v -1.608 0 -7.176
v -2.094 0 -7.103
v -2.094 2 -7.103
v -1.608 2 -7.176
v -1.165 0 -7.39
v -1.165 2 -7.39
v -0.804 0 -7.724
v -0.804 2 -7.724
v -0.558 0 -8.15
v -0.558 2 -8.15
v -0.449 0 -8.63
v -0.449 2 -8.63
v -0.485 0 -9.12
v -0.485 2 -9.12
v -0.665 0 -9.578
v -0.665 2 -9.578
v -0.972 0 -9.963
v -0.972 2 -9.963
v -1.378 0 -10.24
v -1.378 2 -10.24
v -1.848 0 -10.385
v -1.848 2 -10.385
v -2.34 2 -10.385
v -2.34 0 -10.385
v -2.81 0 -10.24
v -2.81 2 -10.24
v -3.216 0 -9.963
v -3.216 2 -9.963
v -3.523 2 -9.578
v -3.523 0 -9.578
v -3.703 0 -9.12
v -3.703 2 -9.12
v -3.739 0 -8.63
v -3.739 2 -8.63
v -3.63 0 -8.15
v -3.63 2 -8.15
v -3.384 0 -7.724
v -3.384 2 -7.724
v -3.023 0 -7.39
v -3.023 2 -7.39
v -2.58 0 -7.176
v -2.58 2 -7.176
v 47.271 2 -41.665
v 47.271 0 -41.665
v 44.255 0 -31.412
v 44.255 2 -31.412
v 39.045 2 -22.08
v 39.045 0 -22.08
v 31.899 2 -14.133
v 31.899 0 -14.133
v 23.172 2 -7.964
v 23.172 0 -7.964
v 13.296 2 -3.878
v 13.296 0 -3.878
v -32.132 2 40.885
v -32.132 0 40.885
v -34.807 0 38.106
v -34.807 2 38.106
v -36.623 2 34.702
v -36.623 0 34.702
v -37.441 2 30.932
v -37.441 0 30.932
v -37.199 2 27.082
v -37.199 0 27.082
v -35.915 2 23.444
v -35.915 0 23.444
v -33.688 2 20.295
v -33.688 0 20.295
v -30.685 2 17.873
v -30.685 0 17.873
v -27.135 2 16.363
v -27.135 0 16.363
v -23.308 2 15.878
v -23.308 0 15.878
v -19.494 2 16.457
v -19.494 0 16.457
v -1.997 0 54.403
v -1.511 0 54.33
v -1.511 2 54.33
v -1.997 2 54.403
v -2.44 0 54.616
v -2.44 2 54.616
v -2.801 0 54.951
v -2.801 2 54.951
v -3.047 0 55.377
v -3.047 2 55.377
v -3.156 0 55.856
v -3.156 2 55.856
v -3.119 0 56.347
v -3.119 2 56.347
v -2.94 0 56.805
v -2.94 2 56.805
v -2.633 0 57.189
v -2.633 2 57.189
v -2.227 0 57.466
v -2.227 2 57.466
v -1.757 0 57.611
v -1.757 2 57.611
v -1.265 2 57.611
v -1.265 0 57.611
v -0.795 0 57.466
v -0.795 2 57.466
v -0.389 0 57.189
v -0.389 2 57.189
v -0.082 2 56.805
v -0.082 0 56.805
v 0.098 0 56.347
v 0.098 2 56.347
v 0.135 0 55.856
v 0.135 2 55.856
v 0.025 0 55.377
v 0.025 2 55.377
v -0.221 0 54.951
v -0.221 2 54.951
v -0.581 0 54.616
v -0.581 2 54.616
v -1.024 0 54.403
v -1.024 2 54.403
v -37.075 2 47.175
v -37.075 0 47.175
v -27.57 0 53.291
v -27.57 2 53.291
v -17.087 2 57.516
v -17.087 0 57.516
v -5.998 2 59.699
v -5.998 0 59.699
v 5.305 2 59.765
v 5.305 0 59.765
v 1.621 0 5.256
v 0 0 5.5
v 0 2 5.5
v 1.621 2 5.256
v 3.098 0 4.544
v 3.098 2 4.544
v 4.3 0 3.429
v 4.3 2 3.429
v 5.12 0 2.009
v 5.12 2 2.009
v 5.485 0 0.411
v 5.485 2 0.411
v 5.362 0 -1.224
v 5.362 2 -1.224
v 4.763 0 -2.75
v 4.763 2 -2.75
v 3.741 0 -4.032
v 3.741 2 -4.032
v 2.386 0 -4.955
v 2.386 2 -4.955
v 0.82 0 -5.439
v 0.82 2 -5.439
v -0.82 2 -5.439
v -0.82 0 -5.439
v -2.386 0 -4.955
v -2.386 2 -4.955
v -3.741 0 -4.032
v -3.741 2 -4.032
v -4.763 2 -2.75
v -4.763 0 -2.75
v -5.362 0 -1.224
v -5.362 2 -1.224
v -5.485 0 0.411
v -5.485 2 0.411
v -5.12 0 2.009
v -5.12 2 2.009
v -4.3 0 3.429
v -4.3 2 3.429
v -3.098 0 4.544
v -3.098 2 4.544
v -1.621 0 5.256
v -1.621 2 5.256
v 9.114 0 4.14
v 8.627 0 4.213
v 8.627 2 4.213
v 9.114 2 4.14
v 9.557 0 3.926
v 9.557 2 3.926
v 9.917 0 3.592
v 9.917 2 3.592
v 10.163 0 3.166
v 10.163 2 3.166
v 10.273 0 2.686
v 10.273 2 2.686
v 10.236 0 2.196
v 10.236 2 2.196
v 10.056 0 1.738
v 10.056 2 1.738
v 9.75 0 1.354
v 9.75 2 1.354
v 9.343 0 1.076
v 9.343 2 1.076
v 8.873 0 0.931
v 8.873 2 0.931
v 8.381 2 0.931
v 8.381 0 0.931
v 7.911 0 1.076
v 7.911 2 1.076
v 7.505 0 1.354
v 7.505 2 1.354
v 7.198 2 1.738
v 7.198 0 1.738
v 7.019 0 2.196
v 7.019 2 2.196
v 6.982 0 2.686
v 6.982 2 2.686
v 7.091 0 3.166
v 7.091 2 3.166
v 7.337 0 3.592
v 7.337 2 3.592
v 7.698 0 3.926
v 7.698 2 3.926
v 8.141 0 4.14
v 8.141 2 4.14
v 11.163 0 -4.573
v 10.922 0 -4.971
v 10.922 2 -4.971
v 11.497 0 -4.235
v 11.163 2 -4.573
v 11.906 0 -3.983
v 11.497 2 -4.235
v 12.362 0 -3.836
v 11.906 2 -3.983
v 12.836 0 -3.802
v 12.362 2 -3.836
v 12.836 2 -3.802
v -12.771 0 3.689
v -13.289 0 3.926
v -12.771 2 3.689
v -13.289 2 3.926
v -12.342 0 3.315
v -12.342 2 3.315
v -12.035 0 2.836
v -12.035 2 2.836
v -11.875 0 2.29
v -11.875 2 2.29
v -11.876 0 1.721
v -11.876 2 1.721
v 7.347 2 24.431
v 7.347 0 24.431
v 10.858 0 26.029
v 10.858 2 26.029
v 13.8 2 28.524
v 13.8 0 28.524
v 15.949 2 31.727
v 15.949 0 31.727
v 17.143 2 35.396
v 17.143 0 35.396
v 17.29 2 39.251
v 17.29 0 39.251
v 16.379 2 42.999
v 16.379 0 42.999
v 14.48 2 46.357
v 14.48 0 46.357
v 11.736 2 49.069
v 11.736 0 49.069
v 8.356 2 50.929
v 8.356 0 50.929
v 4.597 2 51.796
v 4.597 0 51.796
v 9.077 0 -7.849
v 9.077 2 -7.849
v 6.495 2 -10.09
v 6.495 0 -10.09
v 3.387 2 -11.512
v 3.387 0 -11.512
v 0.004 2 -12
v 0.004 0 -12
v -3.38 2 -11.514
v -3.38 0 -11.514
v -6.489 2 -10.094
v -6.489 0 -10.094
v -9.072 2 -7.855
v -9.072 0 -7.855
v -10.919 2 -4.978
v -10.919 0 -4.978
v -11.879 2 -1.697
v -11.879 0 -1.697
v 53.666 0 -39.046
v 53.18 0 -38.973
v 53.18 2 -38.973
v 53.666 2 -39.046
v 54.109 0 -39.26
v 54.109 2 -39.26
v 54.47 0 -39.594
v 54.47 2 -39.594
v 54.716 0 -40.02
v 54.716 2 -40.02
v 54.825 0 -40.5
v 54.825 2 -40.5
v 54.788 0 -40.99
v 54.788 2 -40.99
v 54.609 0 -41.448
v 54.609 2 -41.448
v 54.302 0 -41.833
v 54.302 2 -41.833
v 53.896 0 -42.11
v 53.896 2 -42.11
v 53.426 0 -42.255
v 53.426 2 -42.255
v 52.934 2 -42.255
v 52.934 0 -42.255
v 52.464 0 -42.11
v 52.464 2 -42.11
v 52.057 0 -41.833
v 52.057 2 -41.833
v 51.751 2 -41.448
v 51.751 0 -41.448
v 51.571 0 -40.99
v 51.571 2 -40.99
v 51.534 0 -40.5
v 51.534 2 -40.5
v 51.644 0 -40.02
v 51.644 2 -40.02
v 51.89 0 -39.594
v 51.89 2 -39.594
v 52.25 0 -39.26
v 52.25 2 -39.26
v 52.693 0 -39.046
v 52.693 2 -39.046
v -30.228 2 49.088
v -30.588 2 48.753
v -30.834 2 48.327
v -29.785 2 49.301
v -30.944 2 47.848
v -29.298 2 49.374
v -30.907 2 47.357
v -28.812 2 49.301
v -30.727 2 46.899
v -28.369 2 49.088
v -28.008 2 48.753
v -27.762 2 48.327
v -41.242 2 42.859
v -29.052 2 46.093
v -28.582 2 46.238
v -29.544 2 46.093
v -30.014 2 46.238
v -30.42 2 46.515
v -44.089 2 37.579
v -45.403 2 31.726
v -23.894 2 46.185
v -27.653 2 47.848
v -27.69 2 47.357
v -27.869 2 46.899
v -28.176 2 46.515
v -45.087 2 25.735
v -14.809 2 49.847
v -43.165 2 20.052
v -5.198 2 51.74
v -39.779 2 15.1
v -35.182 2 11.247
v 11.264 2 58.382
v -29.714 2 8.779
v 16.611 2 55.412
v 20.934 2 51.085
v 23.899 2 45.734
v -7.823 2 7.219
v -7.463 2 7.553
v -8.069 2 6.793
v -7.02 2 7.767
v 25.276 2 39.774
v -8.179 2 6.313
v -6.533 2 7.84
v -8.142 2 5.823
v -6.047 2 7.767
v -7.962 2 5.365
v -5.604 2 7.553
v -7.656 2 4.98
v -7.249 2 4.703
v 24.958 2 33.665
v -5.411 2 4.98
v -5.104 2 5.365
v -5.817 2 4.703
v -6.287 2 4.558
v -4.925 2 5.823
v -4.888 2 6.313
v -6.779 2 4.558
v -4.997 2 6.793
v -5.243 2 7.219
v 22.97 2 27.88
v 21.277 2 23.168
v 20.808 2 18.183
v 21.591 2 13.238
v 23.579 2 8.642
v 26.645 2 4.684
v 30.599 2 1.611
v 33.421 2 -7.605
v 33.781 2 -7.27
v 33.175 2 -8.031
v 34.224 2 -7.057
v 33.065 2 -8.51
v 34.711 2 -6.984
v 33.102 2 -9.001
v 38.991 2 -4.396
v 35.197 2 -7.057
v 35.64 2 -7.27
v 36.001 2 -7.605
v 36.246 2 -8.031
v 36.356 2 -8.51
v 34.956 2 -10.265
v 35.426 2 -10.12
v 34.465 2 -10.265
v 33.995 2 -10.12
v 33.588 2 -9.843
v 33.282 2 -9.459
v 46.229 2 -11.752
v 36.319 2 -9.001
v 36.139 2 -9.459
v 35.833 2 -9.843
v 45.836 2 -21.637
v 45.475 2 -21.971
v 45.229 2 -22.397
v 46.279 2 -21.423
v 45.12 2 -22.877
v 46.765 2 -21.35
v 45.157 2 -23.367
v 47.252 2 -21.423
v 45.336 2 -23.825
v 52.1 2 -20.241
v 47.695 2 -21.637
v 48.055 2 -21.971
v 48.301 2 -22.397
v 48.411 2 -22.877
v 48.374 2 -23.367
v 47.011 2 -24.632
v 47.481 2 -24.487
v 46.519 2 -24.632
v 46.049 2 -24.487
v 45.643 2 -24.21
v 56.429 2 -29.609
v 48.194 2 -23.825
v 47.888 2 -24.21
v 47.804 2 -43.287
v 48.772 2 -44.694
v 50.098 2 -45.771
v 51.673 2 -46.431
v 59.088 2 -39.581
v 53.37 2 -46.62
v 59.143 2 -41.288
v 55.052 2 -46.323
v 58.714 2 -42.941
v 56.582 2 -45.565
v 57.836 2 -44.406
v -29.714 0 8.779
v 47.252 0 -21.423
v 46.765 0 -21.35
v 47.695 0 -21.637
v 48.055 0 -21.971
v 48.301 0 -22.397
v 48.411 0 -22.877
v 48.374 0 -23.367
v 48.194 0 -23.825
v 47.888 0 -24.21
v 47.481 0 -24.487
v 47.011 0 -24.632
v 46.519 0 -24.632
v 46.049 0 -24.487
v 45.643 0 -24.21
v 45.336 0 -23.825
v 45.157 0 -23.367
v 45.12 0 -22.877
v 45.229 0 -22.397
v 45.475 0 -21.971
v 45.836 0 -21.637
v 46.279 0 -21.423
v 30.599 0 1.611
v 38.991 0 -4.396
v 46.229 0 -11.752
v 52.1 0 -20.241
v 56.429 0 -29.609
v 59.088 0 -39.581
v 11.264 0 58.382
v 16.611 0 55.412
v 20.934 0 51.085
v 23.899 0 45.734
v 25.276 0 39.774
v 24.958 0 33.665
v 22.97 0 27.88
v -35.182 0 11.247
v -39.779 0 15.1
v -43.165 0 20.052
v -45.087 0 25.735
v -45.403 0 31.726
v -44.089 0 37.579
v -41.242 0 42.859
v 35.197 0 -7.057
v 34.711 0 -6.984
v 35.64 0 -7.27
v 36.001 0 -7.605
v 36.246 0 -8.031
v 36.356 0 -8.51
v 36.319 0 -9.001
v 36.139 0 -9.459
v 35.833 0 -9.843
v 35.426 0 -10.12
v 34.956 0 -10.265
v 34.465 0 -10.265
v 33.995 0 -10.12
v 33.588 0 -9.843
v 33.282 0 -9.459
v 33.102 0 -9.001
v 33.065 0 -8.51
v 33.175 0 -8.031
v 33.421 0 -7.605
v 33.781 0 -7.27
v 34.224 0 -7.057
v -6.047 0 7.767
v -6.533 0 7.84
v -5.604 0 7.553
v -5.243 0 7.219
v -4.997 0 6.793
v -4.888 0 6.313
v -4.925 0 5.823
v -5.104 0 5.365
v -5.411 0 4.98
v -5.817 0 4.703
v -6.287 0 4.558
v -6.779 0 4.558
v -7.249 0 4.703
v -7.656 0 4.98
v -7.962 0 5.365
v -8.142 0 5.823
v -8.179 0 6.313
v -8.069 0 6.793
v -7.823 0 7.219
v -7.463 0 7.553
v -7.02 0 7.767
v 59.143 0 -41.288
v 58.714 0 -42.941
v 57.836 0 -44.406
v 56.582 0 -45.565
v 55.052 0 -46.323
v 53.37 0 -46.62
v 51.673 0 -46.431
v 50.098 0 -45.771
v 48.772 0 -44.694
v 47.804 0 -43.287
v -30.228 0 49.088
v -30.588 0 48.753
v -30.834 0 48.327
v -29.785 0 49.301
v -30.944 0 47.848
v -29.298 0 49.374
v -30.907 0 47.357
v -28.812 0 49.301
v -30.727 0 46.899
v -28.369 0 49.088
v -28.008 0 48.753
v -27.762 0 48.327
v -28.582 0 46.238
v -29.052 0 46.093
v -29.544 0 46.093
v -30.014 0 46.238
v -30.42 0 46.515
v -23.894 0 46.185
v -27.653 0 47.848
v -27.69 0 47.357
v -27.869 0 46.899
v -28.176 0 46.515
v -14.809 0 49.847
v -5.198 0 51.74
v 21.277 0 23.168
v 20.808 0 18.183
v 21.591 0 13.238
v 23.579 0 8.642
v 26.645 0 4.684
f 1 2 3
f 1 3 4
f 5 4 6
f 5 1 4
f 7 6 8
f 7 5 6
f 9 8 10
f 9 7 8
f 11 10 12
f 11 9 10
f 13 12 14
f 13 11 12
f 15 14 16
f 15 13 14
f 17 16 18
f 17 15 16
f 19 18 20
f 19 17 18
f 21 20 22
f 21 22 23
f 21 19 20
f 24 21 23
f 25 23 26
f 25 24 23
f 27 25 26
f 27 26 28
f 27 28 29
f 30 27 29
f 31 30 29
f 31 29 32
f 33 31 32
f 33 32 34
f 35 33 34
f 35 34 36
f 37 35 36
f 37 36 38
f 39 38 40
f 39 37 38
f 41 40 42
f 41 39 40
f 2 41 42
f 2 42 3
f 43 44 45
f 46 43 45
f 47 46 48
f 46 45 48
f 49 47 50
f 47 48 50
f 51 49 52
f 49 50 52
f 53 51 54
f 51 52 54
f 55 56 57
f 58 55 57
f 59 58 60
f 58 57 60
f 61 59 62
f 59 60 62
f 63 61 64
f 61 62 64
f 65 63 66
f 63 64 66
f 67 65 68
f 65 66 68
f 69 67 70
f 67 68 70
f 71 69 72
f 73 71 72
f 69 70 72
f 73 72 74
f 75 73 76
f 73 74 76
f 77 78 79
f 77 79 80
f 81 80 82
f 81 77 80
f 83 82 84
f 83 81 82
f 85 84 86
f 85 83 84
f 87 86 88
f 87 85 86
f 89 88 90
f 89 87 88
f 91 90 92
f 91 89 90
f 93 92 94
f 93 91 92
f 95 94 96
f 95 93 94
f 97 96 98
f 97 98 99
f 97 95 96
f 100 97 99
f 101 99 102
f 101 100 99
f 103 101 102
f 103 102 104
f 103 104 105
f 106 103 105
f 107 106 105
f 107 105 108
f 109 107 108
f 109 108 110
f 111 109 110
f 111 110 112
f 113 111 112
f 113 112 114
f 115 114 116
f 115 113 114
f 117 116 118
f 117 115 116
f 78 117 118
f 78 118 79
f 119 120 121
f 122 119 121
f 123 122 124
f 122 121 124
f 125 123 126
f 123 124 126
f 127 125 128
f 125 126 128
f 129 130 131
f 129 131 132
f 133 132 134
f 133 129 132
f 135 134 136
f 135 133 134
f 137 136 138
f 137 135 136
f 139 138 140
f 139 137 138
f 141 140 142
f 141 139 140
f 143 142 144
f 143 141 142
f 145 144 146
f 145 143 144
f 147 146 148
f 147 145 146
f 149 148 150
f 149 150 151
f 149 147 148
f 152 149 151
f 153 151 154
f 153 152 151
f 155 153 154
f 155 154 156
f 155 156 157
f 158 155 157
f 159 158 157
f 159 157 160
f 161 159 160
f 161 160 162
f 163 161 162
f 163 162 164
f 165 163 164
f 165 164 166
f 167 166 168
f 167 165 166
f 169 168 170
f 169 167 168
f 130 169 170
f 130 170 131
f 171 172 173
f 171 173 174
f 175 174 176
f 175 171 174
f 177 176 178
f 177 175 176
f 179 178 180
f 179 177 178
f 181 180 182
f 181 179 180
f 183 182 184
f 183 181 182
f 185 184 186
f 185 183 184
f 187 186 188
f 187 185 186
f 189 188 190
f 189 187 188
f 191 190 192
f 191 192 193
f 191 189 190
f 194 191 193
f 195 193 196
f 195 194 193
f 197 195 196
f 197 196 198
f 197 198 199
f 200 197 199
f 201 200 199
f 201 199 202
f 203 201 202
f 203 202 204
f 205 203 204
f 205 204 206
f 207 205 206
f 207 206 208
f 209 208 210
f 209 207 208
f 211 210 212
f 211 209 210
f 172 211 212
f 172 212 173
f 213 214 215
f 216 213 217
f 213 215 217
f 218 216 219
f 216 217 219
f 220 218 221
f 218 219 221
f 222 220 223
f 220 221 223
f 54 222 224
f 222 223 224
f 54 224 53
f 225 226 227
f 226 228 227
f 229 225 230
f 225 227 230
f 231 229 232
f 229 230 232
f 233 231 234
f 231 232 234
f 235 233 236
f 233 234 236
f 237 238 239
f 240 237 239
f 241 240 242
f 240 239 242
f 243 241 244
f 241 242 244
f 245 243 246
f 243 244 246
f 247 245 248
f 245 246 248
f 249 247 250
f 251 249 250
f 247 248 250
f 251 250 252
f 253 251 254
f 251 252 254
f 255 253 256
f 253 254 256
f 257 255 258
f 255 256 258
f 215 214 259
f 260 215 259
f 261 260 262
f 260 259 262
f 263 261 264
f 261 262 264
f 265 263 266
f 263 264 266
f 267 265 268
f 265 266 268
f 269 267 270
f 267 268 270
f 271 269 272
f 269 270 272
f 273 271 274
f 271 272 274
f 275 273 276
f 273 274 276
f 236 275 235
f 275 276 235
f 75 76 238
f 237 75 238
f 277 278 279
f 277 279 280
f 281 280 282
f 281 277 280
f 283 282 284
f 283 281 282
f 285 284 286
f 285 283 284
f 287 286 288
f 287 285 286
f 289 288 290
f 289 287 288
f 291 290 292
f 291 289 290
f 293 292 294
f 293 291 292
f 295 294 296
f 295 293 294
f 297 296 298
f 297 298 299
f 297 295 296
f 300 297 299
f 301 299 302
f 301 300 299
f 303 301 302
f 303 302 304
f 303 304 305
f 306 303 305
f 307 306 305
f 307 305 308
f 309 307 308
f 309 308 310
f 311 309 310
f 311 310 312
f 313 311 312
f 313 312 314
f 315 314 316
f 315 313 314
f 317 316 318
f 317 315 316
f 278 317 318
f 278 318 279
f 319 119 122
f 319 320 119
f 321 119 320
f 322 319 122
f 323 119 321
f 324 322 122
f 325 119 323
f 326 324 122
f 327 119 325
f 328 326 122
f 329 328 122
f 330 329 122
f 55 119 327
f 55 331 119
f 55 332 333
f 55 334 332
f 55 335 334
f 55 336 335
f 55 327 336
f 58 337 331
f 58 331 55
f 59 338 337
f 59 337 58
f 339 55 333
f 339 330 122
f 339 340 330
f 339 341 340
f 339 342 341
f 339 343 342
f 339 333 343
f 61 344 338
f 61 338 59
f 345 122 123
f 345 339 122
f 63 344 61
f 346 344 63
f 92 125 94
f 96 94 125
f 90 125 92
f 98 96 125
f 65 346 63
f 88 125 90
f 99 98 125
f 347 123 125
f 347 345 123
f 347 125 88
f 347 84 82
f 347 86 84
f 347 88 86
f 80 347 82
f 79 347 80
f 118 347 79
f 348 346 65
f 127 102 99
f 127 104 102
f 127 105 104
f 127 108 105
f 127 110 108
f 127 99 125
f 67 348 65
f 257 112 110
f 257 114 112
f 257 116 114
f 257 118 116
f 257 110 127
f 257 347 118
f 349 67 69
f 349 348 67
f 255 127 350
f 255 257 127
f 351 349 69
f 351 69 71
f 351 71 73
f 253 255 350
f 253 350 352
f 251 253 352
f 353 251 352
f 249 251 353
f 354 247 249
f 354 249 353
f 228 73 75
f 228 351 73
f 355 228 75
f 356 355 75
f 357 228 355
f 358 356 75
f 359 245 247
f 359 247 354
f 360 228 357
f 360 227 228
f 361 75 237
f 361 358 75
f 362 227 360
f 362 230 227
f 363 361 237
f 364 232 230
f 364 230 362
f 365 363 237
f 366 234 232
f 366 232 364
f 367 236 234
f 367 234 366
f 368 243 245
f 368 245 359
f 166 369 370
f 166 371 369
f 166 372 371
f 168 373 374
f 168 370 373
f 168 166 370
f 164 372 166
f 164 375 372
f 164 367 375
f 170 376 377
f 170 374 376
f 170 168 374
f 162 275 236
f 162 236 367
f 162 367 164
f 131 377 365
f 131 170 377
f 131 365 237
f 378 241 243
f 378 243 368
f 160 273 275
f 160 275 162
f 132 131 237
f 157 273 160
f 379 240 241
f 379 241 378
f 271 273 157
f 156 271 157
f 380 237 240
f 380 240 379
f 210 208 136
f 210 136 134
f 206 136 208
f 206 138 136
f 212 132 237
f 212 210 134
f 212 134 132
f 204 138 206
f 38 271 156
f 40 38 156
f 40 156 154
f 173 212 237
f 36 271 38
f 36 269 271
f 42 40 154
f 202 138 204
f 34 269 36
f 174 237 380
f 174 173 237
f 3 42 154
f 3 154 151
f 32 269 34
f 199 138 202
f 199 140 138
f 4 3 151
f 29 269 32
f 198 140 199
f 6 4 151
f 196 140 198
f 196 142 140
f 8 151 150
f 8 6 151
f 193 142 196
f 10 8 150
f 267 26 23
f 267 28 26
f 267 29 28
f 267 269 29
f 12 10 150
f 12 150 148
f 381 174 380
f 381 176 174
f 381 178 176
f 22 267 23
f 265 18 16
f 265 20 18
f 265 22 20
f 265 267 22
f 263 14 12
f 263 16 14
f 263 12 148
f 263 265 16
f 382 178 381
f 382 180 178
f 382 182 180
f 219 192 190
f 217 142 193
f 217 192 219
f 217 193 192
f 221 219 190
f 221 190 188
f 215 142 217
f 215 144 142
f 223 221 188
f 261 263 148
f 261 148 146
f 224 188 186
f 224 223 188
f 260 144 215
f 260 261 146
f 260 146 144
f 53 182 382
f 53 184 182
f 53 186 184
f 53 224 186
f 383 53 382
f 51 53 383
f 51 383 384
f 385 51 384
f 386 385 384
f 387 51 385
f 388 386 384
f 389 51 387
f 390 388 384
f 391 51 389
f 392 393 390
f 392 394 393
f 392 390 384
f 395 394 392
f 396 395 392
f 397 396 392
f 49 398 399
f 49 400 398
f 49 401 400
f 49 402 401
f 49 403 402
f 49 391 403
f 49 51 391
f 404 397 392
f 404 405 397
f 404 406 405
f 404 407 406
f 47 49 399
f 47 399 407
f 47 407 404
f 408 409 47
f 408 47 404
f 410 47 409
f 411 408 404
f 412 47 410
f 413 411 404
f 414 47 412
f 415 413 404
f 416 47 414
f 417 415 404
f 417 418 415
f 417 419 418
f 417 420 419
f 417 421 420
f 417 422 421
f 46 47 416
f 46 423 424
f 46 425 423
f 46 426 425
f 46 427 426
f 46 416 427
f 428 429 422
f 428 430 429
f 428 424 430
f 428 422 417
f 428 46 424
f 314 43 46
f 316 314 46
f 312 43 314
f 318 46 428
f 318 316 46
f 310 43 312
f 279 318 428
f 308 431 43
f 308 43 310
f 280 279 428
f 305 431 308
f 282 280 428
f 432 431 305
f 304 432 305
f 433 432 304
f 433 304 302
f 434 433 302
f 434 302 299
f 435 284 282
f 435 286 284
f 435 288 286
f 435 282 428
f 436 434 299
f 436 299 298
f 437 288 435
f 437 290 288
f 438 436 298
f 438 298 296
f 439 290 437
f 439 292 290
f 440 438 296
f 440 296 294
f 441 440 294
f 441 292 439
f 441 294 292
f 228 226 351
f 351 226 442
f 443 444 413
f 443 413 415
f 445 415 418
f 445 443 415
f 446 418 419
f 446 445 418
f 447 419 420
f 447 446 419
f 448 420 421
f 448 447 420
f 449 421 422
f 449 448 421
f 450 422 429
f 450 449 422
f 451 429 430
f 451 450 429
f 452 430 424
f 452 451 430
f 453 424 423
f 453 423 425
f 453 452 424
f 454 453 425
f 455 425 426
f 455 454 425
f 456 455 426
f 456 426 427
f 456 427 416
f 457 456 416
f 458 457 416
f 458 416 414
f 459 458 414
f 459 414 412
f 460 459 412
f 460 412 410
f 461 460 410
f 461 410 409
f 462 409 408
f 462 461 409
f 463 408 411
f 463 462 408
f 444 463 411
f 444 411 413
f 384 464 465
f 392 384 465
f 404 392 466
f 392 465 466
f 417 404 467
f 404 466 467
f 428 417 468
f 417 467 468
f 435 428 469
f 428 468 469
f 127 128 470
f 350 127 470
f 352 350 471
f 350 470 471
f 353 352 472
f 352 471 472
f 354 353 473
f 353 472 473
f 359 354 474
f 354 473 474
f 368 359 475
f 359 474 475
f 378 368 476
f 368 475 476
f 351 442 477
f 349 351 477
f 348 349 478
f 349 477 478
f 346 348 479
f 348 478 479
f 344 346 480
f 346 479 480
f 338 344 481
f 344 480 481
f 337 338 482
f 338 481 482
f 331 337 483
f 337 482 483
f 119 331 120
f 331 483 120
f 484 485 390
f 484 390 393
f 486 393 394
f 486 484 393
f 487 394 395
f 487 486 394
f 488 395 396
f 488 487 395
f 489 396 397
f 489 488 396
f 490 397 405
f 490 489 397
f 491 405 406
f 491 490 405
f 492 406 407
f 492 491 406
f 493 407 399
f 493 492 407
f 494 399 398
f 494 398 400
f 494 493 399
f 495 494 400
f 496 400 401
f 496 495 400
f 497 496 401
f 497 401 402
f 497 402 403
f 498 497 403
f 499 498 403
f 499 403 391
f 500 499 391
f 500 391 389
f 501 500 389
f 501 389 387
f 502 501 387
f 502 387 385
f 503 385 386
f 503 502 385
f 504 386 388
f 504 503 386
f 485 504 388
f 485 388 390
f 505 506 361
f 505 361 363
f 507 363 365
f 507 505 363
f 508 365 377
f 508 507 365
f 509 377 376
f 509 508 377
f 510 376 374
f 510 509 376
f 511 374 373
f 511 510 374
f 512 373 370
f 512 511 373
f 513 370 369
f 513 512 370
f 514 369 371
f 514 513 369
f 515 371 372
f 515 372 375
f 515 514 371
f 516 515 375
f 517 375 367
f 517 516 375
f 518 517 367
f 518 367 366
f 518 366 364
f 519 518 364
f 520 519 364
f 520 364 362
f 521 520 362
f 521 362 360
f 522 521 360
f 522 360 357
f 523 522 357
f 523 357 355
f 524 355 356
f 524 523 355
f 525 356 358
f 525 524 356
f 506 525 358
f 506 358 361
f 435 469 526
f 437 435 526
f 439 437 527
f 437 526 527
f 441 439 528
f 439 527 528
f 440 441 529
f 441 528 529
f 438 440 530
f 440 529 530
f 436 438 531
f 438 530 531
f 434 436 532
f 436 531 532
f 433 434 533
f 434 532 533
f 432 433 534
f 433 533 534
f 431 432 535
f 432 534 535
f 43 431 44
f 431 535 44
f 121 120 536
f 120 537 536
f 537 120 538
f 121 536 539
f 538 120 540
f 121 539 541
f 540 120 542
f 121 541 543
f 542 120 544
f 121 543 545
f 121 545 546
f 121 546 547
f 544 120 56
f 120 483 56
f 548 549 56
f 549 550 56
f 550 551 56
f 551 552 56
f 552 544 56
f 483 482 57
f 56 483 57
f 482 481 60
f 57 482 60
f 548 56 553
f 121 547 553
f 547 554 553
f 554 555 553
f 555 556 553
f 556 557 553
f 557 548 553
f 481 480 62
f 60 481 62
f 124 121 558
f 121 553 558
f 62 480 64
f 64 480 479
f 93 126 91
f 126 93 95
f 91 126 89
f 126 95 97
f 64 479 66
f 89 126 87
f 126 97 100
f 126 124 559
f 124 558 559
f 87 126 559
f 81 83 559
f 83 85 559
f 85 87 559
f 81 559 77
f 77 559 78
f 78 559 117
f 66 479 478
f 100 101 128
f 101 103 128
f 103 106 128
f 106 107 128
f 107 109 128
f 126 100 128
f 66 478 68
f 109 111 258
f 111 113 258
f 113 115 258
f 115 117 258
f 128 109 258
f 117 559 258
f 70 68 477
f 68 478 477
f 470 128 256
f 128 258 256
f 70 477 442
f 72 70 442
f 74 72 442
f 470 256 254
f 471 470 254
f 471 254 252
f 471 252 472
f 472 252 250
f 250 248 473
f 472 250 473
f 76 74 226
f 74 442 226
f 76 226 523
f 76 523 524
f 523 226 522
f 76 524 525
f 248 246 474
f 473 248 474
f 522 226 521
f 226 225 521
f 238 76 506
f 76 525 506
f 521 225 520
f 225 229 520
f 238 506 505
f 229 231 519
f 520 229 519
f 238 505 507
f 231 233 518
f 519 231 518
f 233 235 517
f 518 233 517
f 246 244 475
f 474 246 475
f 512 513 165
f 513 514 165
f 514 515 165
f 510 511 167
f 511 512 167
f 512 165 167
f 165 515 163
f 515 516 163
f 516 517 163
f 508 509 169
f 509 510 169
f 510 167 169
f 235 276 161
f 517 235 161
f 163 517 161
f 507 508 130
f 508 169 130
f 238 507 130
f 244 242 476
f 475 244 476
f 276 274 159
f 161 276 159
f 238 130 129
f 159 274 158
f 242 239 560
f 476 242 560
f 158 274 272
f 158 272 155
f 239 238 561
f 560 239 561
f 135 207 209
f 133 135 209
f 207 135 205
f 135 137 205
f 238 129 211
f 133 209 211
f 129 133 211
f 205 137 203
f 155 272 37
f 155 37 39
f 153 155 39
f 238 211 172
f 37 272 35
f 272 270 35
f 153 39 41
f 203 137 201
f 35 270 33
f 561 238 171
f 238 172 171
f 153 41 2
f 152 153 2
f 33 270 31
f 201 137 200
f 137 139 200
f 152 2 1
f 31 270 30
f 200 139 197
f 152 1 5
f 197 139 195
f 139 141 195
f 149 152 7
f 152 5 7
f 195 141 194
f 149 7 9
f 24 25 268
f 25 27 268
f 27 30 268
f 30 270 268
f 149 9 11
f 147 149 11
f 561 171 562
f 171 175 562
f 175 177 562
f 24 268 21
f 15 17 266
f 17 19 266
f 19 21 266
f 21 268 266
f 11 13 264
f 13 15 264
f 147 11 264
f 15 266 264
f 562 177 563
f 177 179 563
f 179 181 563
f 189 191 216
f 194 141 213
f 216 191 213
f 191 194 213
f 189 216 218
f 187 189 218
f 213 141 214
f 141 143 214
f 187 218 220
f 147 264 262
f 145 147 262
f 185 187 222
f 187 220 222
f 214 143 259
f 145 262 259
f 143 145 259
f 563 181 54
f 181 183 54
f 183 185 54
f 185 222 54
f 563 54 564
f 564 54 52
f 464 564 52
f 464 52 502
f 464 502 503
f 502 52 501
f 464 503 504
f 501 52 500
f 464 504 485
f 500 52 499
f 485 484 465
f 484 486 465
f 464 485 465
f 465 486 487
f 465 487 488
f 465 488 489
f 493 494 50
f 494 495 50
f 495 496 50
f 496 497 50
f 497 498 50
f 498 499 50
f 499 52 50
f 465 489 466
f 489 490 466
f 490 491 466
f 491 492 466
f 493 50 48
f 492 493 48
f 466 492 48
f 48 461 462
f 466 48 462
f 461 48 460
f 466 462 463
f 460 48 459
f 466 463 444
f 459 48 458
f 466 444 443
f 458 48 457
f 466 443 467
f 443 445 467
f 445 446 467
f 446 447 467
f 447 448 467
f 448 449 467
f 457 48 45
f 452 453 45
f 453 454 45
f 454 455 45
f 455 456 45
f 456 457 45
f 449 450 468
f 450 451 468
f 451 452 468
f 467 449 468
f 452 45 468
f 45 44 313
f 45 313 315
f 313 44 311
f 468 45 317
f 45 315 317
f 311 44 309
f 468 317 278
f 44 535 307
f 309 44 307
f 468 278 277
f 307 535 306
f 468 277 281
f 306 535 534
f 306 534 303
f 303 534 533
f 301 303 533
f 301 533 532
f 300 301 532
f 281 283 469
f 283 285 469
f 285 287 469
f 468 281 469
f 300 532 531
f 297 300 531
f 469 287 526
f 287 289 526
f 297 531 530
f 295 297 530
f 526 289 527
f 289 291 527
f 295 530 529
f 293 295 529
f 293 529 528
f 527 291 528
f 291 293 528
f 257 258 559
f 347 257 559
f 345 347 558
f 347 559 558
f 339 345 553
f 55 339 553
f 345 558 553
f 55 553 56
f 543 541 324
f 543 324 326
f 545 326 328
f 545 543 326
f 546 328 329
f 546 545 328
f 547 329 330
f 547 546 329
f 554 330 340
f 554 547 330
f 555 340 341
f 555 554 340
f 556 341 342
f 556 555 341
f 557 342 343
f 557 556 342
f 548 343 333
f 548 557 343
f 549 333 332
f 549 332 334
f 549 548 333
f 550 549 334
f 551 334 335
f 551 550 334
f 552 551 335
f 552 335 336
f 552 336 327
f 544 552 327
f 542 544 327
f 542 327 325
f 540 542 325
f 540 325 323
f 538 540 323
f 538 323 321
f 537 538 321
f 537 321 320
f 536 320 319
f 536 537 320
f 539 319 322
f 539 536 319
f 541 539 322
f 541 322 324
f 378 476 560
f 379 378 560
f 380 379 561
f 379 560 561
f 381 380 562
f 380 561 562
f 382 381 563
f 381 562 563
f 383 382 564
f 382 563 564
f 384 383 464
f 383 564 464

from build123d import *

# Parameters (mm, degrees)
SKETCH_1_R         = 1.65
SKETCH_1_R_2       = 5.5
EXTRUDE_4604_DEPTH = 2
FILLET_1_R         = 2


with BuildPart() as part:
    # Эскиз1 → Extrude 4604 (new body)
    with BuildSketch(Plane(origin=(0, 0, 0), x_dir=(1, 0, 0), z_dir=(0, 1, 0))):
        with BuildLine():
            Line((-11.508257905, -3.4), (-29.714194139, -8.778762251))
            ThreePointArc((-29.714194139, -8.778762251), (-45.087395339, -25.73505383), (-37.075043377, -47.1745817))
            ThreePointArc((-37.075043377, -47.1745817), (-17.087040134, -57.515502775), (5.304800773, -59.765032325))
            ThreePointArc((5.304800773, -59.765032325), (22.603580264, -48.512957528), (22.97025793, -27.879913482))
            ThreePointArc((22.97025793, -27.879913482), (21.591479888, -13.237630517), (30.59852352, -1.611339436))
            ThreePointArc((30.59852352, -1.611339436), (49.34717261, 15.870005048), (59.088465181, 39.58110934))
            ThreePointArc((59.088465181, 39.58110934), (54.221507729, 46.531844924), (47.270772145, 41.664887472))
            ThreePointArc((47.270772145, 41.664887472), (35.068418794, 17.224917951), (11.508257905, 3.4))
            ThreePointArc((11.508257905, 3.4), (-3.4, 11.508257905), (-11.508257905, -3.4))
        make_face()
        with Locations(Location((-1.510792129, -55.97961689, 0), (0, 0, 90))):
            Circle(SKETCH_1_R, mode=Mode.SUBTRACT)
        with Locations(Location((-29.298192809, -47.724374256, 0), (0, 0, 270))):
            Circle(SKETCH_1_R, mode=Mode.SUBTRACT)
        with Locations(Location((0, 0, 0), (0, 0, 270))):
            Circle(SKETCH_1_R_2, mode=Mode.SUBTRACT)
        with Locations(Location((8.627325416, -2.56305602, 0), (0, 0, 270))):
            Circle(SKETCH_1_R, mode=Mode.SUBTRACT)
        with Locations(Location((-6.533334333, -6.189954967, 0), (0, 0, 270))):
            Circle(SKETCH_1_R, mode=Mode.SUBTRACT)
        with Locations(Location((-2.093991083, 8.753010987, 0), (0, 0, 270))):
            Circle(SKETCH_1_R, mode=Mode.SUBTRACT)
        with Locations(Location((53.179618663, 40.622998406, 0), (0, 0, 270))):
            Circle(SKETCH_1_R, mode=Mode.SUBTRACT)
        with Locations(Location((46.765371804, 23, 0), (0, 0, 270))):
            Circle(SKETCH_1_R, mode=Mode.SUBTRACT)
        with Locations(Location((34.710530923, 8.633600072, 0), (0, 0, 270))):
            Circle(SKETCH_1_R, mode=Mode.SUBTRACT)
        with BuildLine():
            Line((-19.493884775, -16.456951096), (7.346683187, -24.430903158))
            ThreePointArc((7.346683187, -24.430903158), (17.289589147, -39.25061121), (4.597494003, -51.796361348))
            ThreePointArc((4.597494003, -51.796361348), (-14.808768116, -49.846769072), (-32.13170426, -40.884637473))
            ThreePointArc((-32.13170426, -40.884637473), (-35.915324215, -23.444186054), (-19.493884775, -16.456951096))
        make_face(mode=Mode.SUBTRACT)
    extrude(amount=EXTRUDE_4604_DEPTH)

    # Скругление1
    fillet_1_edges = [part.edges().sort_by_distance(p)[0] for p in [
        (-11.508257905, 1, 3.4),
        (11.508257905, 1, -3.4),
    ]]
    fillet(fillet_1_edges, radius=FILLET_1_R)


solid = part.part
